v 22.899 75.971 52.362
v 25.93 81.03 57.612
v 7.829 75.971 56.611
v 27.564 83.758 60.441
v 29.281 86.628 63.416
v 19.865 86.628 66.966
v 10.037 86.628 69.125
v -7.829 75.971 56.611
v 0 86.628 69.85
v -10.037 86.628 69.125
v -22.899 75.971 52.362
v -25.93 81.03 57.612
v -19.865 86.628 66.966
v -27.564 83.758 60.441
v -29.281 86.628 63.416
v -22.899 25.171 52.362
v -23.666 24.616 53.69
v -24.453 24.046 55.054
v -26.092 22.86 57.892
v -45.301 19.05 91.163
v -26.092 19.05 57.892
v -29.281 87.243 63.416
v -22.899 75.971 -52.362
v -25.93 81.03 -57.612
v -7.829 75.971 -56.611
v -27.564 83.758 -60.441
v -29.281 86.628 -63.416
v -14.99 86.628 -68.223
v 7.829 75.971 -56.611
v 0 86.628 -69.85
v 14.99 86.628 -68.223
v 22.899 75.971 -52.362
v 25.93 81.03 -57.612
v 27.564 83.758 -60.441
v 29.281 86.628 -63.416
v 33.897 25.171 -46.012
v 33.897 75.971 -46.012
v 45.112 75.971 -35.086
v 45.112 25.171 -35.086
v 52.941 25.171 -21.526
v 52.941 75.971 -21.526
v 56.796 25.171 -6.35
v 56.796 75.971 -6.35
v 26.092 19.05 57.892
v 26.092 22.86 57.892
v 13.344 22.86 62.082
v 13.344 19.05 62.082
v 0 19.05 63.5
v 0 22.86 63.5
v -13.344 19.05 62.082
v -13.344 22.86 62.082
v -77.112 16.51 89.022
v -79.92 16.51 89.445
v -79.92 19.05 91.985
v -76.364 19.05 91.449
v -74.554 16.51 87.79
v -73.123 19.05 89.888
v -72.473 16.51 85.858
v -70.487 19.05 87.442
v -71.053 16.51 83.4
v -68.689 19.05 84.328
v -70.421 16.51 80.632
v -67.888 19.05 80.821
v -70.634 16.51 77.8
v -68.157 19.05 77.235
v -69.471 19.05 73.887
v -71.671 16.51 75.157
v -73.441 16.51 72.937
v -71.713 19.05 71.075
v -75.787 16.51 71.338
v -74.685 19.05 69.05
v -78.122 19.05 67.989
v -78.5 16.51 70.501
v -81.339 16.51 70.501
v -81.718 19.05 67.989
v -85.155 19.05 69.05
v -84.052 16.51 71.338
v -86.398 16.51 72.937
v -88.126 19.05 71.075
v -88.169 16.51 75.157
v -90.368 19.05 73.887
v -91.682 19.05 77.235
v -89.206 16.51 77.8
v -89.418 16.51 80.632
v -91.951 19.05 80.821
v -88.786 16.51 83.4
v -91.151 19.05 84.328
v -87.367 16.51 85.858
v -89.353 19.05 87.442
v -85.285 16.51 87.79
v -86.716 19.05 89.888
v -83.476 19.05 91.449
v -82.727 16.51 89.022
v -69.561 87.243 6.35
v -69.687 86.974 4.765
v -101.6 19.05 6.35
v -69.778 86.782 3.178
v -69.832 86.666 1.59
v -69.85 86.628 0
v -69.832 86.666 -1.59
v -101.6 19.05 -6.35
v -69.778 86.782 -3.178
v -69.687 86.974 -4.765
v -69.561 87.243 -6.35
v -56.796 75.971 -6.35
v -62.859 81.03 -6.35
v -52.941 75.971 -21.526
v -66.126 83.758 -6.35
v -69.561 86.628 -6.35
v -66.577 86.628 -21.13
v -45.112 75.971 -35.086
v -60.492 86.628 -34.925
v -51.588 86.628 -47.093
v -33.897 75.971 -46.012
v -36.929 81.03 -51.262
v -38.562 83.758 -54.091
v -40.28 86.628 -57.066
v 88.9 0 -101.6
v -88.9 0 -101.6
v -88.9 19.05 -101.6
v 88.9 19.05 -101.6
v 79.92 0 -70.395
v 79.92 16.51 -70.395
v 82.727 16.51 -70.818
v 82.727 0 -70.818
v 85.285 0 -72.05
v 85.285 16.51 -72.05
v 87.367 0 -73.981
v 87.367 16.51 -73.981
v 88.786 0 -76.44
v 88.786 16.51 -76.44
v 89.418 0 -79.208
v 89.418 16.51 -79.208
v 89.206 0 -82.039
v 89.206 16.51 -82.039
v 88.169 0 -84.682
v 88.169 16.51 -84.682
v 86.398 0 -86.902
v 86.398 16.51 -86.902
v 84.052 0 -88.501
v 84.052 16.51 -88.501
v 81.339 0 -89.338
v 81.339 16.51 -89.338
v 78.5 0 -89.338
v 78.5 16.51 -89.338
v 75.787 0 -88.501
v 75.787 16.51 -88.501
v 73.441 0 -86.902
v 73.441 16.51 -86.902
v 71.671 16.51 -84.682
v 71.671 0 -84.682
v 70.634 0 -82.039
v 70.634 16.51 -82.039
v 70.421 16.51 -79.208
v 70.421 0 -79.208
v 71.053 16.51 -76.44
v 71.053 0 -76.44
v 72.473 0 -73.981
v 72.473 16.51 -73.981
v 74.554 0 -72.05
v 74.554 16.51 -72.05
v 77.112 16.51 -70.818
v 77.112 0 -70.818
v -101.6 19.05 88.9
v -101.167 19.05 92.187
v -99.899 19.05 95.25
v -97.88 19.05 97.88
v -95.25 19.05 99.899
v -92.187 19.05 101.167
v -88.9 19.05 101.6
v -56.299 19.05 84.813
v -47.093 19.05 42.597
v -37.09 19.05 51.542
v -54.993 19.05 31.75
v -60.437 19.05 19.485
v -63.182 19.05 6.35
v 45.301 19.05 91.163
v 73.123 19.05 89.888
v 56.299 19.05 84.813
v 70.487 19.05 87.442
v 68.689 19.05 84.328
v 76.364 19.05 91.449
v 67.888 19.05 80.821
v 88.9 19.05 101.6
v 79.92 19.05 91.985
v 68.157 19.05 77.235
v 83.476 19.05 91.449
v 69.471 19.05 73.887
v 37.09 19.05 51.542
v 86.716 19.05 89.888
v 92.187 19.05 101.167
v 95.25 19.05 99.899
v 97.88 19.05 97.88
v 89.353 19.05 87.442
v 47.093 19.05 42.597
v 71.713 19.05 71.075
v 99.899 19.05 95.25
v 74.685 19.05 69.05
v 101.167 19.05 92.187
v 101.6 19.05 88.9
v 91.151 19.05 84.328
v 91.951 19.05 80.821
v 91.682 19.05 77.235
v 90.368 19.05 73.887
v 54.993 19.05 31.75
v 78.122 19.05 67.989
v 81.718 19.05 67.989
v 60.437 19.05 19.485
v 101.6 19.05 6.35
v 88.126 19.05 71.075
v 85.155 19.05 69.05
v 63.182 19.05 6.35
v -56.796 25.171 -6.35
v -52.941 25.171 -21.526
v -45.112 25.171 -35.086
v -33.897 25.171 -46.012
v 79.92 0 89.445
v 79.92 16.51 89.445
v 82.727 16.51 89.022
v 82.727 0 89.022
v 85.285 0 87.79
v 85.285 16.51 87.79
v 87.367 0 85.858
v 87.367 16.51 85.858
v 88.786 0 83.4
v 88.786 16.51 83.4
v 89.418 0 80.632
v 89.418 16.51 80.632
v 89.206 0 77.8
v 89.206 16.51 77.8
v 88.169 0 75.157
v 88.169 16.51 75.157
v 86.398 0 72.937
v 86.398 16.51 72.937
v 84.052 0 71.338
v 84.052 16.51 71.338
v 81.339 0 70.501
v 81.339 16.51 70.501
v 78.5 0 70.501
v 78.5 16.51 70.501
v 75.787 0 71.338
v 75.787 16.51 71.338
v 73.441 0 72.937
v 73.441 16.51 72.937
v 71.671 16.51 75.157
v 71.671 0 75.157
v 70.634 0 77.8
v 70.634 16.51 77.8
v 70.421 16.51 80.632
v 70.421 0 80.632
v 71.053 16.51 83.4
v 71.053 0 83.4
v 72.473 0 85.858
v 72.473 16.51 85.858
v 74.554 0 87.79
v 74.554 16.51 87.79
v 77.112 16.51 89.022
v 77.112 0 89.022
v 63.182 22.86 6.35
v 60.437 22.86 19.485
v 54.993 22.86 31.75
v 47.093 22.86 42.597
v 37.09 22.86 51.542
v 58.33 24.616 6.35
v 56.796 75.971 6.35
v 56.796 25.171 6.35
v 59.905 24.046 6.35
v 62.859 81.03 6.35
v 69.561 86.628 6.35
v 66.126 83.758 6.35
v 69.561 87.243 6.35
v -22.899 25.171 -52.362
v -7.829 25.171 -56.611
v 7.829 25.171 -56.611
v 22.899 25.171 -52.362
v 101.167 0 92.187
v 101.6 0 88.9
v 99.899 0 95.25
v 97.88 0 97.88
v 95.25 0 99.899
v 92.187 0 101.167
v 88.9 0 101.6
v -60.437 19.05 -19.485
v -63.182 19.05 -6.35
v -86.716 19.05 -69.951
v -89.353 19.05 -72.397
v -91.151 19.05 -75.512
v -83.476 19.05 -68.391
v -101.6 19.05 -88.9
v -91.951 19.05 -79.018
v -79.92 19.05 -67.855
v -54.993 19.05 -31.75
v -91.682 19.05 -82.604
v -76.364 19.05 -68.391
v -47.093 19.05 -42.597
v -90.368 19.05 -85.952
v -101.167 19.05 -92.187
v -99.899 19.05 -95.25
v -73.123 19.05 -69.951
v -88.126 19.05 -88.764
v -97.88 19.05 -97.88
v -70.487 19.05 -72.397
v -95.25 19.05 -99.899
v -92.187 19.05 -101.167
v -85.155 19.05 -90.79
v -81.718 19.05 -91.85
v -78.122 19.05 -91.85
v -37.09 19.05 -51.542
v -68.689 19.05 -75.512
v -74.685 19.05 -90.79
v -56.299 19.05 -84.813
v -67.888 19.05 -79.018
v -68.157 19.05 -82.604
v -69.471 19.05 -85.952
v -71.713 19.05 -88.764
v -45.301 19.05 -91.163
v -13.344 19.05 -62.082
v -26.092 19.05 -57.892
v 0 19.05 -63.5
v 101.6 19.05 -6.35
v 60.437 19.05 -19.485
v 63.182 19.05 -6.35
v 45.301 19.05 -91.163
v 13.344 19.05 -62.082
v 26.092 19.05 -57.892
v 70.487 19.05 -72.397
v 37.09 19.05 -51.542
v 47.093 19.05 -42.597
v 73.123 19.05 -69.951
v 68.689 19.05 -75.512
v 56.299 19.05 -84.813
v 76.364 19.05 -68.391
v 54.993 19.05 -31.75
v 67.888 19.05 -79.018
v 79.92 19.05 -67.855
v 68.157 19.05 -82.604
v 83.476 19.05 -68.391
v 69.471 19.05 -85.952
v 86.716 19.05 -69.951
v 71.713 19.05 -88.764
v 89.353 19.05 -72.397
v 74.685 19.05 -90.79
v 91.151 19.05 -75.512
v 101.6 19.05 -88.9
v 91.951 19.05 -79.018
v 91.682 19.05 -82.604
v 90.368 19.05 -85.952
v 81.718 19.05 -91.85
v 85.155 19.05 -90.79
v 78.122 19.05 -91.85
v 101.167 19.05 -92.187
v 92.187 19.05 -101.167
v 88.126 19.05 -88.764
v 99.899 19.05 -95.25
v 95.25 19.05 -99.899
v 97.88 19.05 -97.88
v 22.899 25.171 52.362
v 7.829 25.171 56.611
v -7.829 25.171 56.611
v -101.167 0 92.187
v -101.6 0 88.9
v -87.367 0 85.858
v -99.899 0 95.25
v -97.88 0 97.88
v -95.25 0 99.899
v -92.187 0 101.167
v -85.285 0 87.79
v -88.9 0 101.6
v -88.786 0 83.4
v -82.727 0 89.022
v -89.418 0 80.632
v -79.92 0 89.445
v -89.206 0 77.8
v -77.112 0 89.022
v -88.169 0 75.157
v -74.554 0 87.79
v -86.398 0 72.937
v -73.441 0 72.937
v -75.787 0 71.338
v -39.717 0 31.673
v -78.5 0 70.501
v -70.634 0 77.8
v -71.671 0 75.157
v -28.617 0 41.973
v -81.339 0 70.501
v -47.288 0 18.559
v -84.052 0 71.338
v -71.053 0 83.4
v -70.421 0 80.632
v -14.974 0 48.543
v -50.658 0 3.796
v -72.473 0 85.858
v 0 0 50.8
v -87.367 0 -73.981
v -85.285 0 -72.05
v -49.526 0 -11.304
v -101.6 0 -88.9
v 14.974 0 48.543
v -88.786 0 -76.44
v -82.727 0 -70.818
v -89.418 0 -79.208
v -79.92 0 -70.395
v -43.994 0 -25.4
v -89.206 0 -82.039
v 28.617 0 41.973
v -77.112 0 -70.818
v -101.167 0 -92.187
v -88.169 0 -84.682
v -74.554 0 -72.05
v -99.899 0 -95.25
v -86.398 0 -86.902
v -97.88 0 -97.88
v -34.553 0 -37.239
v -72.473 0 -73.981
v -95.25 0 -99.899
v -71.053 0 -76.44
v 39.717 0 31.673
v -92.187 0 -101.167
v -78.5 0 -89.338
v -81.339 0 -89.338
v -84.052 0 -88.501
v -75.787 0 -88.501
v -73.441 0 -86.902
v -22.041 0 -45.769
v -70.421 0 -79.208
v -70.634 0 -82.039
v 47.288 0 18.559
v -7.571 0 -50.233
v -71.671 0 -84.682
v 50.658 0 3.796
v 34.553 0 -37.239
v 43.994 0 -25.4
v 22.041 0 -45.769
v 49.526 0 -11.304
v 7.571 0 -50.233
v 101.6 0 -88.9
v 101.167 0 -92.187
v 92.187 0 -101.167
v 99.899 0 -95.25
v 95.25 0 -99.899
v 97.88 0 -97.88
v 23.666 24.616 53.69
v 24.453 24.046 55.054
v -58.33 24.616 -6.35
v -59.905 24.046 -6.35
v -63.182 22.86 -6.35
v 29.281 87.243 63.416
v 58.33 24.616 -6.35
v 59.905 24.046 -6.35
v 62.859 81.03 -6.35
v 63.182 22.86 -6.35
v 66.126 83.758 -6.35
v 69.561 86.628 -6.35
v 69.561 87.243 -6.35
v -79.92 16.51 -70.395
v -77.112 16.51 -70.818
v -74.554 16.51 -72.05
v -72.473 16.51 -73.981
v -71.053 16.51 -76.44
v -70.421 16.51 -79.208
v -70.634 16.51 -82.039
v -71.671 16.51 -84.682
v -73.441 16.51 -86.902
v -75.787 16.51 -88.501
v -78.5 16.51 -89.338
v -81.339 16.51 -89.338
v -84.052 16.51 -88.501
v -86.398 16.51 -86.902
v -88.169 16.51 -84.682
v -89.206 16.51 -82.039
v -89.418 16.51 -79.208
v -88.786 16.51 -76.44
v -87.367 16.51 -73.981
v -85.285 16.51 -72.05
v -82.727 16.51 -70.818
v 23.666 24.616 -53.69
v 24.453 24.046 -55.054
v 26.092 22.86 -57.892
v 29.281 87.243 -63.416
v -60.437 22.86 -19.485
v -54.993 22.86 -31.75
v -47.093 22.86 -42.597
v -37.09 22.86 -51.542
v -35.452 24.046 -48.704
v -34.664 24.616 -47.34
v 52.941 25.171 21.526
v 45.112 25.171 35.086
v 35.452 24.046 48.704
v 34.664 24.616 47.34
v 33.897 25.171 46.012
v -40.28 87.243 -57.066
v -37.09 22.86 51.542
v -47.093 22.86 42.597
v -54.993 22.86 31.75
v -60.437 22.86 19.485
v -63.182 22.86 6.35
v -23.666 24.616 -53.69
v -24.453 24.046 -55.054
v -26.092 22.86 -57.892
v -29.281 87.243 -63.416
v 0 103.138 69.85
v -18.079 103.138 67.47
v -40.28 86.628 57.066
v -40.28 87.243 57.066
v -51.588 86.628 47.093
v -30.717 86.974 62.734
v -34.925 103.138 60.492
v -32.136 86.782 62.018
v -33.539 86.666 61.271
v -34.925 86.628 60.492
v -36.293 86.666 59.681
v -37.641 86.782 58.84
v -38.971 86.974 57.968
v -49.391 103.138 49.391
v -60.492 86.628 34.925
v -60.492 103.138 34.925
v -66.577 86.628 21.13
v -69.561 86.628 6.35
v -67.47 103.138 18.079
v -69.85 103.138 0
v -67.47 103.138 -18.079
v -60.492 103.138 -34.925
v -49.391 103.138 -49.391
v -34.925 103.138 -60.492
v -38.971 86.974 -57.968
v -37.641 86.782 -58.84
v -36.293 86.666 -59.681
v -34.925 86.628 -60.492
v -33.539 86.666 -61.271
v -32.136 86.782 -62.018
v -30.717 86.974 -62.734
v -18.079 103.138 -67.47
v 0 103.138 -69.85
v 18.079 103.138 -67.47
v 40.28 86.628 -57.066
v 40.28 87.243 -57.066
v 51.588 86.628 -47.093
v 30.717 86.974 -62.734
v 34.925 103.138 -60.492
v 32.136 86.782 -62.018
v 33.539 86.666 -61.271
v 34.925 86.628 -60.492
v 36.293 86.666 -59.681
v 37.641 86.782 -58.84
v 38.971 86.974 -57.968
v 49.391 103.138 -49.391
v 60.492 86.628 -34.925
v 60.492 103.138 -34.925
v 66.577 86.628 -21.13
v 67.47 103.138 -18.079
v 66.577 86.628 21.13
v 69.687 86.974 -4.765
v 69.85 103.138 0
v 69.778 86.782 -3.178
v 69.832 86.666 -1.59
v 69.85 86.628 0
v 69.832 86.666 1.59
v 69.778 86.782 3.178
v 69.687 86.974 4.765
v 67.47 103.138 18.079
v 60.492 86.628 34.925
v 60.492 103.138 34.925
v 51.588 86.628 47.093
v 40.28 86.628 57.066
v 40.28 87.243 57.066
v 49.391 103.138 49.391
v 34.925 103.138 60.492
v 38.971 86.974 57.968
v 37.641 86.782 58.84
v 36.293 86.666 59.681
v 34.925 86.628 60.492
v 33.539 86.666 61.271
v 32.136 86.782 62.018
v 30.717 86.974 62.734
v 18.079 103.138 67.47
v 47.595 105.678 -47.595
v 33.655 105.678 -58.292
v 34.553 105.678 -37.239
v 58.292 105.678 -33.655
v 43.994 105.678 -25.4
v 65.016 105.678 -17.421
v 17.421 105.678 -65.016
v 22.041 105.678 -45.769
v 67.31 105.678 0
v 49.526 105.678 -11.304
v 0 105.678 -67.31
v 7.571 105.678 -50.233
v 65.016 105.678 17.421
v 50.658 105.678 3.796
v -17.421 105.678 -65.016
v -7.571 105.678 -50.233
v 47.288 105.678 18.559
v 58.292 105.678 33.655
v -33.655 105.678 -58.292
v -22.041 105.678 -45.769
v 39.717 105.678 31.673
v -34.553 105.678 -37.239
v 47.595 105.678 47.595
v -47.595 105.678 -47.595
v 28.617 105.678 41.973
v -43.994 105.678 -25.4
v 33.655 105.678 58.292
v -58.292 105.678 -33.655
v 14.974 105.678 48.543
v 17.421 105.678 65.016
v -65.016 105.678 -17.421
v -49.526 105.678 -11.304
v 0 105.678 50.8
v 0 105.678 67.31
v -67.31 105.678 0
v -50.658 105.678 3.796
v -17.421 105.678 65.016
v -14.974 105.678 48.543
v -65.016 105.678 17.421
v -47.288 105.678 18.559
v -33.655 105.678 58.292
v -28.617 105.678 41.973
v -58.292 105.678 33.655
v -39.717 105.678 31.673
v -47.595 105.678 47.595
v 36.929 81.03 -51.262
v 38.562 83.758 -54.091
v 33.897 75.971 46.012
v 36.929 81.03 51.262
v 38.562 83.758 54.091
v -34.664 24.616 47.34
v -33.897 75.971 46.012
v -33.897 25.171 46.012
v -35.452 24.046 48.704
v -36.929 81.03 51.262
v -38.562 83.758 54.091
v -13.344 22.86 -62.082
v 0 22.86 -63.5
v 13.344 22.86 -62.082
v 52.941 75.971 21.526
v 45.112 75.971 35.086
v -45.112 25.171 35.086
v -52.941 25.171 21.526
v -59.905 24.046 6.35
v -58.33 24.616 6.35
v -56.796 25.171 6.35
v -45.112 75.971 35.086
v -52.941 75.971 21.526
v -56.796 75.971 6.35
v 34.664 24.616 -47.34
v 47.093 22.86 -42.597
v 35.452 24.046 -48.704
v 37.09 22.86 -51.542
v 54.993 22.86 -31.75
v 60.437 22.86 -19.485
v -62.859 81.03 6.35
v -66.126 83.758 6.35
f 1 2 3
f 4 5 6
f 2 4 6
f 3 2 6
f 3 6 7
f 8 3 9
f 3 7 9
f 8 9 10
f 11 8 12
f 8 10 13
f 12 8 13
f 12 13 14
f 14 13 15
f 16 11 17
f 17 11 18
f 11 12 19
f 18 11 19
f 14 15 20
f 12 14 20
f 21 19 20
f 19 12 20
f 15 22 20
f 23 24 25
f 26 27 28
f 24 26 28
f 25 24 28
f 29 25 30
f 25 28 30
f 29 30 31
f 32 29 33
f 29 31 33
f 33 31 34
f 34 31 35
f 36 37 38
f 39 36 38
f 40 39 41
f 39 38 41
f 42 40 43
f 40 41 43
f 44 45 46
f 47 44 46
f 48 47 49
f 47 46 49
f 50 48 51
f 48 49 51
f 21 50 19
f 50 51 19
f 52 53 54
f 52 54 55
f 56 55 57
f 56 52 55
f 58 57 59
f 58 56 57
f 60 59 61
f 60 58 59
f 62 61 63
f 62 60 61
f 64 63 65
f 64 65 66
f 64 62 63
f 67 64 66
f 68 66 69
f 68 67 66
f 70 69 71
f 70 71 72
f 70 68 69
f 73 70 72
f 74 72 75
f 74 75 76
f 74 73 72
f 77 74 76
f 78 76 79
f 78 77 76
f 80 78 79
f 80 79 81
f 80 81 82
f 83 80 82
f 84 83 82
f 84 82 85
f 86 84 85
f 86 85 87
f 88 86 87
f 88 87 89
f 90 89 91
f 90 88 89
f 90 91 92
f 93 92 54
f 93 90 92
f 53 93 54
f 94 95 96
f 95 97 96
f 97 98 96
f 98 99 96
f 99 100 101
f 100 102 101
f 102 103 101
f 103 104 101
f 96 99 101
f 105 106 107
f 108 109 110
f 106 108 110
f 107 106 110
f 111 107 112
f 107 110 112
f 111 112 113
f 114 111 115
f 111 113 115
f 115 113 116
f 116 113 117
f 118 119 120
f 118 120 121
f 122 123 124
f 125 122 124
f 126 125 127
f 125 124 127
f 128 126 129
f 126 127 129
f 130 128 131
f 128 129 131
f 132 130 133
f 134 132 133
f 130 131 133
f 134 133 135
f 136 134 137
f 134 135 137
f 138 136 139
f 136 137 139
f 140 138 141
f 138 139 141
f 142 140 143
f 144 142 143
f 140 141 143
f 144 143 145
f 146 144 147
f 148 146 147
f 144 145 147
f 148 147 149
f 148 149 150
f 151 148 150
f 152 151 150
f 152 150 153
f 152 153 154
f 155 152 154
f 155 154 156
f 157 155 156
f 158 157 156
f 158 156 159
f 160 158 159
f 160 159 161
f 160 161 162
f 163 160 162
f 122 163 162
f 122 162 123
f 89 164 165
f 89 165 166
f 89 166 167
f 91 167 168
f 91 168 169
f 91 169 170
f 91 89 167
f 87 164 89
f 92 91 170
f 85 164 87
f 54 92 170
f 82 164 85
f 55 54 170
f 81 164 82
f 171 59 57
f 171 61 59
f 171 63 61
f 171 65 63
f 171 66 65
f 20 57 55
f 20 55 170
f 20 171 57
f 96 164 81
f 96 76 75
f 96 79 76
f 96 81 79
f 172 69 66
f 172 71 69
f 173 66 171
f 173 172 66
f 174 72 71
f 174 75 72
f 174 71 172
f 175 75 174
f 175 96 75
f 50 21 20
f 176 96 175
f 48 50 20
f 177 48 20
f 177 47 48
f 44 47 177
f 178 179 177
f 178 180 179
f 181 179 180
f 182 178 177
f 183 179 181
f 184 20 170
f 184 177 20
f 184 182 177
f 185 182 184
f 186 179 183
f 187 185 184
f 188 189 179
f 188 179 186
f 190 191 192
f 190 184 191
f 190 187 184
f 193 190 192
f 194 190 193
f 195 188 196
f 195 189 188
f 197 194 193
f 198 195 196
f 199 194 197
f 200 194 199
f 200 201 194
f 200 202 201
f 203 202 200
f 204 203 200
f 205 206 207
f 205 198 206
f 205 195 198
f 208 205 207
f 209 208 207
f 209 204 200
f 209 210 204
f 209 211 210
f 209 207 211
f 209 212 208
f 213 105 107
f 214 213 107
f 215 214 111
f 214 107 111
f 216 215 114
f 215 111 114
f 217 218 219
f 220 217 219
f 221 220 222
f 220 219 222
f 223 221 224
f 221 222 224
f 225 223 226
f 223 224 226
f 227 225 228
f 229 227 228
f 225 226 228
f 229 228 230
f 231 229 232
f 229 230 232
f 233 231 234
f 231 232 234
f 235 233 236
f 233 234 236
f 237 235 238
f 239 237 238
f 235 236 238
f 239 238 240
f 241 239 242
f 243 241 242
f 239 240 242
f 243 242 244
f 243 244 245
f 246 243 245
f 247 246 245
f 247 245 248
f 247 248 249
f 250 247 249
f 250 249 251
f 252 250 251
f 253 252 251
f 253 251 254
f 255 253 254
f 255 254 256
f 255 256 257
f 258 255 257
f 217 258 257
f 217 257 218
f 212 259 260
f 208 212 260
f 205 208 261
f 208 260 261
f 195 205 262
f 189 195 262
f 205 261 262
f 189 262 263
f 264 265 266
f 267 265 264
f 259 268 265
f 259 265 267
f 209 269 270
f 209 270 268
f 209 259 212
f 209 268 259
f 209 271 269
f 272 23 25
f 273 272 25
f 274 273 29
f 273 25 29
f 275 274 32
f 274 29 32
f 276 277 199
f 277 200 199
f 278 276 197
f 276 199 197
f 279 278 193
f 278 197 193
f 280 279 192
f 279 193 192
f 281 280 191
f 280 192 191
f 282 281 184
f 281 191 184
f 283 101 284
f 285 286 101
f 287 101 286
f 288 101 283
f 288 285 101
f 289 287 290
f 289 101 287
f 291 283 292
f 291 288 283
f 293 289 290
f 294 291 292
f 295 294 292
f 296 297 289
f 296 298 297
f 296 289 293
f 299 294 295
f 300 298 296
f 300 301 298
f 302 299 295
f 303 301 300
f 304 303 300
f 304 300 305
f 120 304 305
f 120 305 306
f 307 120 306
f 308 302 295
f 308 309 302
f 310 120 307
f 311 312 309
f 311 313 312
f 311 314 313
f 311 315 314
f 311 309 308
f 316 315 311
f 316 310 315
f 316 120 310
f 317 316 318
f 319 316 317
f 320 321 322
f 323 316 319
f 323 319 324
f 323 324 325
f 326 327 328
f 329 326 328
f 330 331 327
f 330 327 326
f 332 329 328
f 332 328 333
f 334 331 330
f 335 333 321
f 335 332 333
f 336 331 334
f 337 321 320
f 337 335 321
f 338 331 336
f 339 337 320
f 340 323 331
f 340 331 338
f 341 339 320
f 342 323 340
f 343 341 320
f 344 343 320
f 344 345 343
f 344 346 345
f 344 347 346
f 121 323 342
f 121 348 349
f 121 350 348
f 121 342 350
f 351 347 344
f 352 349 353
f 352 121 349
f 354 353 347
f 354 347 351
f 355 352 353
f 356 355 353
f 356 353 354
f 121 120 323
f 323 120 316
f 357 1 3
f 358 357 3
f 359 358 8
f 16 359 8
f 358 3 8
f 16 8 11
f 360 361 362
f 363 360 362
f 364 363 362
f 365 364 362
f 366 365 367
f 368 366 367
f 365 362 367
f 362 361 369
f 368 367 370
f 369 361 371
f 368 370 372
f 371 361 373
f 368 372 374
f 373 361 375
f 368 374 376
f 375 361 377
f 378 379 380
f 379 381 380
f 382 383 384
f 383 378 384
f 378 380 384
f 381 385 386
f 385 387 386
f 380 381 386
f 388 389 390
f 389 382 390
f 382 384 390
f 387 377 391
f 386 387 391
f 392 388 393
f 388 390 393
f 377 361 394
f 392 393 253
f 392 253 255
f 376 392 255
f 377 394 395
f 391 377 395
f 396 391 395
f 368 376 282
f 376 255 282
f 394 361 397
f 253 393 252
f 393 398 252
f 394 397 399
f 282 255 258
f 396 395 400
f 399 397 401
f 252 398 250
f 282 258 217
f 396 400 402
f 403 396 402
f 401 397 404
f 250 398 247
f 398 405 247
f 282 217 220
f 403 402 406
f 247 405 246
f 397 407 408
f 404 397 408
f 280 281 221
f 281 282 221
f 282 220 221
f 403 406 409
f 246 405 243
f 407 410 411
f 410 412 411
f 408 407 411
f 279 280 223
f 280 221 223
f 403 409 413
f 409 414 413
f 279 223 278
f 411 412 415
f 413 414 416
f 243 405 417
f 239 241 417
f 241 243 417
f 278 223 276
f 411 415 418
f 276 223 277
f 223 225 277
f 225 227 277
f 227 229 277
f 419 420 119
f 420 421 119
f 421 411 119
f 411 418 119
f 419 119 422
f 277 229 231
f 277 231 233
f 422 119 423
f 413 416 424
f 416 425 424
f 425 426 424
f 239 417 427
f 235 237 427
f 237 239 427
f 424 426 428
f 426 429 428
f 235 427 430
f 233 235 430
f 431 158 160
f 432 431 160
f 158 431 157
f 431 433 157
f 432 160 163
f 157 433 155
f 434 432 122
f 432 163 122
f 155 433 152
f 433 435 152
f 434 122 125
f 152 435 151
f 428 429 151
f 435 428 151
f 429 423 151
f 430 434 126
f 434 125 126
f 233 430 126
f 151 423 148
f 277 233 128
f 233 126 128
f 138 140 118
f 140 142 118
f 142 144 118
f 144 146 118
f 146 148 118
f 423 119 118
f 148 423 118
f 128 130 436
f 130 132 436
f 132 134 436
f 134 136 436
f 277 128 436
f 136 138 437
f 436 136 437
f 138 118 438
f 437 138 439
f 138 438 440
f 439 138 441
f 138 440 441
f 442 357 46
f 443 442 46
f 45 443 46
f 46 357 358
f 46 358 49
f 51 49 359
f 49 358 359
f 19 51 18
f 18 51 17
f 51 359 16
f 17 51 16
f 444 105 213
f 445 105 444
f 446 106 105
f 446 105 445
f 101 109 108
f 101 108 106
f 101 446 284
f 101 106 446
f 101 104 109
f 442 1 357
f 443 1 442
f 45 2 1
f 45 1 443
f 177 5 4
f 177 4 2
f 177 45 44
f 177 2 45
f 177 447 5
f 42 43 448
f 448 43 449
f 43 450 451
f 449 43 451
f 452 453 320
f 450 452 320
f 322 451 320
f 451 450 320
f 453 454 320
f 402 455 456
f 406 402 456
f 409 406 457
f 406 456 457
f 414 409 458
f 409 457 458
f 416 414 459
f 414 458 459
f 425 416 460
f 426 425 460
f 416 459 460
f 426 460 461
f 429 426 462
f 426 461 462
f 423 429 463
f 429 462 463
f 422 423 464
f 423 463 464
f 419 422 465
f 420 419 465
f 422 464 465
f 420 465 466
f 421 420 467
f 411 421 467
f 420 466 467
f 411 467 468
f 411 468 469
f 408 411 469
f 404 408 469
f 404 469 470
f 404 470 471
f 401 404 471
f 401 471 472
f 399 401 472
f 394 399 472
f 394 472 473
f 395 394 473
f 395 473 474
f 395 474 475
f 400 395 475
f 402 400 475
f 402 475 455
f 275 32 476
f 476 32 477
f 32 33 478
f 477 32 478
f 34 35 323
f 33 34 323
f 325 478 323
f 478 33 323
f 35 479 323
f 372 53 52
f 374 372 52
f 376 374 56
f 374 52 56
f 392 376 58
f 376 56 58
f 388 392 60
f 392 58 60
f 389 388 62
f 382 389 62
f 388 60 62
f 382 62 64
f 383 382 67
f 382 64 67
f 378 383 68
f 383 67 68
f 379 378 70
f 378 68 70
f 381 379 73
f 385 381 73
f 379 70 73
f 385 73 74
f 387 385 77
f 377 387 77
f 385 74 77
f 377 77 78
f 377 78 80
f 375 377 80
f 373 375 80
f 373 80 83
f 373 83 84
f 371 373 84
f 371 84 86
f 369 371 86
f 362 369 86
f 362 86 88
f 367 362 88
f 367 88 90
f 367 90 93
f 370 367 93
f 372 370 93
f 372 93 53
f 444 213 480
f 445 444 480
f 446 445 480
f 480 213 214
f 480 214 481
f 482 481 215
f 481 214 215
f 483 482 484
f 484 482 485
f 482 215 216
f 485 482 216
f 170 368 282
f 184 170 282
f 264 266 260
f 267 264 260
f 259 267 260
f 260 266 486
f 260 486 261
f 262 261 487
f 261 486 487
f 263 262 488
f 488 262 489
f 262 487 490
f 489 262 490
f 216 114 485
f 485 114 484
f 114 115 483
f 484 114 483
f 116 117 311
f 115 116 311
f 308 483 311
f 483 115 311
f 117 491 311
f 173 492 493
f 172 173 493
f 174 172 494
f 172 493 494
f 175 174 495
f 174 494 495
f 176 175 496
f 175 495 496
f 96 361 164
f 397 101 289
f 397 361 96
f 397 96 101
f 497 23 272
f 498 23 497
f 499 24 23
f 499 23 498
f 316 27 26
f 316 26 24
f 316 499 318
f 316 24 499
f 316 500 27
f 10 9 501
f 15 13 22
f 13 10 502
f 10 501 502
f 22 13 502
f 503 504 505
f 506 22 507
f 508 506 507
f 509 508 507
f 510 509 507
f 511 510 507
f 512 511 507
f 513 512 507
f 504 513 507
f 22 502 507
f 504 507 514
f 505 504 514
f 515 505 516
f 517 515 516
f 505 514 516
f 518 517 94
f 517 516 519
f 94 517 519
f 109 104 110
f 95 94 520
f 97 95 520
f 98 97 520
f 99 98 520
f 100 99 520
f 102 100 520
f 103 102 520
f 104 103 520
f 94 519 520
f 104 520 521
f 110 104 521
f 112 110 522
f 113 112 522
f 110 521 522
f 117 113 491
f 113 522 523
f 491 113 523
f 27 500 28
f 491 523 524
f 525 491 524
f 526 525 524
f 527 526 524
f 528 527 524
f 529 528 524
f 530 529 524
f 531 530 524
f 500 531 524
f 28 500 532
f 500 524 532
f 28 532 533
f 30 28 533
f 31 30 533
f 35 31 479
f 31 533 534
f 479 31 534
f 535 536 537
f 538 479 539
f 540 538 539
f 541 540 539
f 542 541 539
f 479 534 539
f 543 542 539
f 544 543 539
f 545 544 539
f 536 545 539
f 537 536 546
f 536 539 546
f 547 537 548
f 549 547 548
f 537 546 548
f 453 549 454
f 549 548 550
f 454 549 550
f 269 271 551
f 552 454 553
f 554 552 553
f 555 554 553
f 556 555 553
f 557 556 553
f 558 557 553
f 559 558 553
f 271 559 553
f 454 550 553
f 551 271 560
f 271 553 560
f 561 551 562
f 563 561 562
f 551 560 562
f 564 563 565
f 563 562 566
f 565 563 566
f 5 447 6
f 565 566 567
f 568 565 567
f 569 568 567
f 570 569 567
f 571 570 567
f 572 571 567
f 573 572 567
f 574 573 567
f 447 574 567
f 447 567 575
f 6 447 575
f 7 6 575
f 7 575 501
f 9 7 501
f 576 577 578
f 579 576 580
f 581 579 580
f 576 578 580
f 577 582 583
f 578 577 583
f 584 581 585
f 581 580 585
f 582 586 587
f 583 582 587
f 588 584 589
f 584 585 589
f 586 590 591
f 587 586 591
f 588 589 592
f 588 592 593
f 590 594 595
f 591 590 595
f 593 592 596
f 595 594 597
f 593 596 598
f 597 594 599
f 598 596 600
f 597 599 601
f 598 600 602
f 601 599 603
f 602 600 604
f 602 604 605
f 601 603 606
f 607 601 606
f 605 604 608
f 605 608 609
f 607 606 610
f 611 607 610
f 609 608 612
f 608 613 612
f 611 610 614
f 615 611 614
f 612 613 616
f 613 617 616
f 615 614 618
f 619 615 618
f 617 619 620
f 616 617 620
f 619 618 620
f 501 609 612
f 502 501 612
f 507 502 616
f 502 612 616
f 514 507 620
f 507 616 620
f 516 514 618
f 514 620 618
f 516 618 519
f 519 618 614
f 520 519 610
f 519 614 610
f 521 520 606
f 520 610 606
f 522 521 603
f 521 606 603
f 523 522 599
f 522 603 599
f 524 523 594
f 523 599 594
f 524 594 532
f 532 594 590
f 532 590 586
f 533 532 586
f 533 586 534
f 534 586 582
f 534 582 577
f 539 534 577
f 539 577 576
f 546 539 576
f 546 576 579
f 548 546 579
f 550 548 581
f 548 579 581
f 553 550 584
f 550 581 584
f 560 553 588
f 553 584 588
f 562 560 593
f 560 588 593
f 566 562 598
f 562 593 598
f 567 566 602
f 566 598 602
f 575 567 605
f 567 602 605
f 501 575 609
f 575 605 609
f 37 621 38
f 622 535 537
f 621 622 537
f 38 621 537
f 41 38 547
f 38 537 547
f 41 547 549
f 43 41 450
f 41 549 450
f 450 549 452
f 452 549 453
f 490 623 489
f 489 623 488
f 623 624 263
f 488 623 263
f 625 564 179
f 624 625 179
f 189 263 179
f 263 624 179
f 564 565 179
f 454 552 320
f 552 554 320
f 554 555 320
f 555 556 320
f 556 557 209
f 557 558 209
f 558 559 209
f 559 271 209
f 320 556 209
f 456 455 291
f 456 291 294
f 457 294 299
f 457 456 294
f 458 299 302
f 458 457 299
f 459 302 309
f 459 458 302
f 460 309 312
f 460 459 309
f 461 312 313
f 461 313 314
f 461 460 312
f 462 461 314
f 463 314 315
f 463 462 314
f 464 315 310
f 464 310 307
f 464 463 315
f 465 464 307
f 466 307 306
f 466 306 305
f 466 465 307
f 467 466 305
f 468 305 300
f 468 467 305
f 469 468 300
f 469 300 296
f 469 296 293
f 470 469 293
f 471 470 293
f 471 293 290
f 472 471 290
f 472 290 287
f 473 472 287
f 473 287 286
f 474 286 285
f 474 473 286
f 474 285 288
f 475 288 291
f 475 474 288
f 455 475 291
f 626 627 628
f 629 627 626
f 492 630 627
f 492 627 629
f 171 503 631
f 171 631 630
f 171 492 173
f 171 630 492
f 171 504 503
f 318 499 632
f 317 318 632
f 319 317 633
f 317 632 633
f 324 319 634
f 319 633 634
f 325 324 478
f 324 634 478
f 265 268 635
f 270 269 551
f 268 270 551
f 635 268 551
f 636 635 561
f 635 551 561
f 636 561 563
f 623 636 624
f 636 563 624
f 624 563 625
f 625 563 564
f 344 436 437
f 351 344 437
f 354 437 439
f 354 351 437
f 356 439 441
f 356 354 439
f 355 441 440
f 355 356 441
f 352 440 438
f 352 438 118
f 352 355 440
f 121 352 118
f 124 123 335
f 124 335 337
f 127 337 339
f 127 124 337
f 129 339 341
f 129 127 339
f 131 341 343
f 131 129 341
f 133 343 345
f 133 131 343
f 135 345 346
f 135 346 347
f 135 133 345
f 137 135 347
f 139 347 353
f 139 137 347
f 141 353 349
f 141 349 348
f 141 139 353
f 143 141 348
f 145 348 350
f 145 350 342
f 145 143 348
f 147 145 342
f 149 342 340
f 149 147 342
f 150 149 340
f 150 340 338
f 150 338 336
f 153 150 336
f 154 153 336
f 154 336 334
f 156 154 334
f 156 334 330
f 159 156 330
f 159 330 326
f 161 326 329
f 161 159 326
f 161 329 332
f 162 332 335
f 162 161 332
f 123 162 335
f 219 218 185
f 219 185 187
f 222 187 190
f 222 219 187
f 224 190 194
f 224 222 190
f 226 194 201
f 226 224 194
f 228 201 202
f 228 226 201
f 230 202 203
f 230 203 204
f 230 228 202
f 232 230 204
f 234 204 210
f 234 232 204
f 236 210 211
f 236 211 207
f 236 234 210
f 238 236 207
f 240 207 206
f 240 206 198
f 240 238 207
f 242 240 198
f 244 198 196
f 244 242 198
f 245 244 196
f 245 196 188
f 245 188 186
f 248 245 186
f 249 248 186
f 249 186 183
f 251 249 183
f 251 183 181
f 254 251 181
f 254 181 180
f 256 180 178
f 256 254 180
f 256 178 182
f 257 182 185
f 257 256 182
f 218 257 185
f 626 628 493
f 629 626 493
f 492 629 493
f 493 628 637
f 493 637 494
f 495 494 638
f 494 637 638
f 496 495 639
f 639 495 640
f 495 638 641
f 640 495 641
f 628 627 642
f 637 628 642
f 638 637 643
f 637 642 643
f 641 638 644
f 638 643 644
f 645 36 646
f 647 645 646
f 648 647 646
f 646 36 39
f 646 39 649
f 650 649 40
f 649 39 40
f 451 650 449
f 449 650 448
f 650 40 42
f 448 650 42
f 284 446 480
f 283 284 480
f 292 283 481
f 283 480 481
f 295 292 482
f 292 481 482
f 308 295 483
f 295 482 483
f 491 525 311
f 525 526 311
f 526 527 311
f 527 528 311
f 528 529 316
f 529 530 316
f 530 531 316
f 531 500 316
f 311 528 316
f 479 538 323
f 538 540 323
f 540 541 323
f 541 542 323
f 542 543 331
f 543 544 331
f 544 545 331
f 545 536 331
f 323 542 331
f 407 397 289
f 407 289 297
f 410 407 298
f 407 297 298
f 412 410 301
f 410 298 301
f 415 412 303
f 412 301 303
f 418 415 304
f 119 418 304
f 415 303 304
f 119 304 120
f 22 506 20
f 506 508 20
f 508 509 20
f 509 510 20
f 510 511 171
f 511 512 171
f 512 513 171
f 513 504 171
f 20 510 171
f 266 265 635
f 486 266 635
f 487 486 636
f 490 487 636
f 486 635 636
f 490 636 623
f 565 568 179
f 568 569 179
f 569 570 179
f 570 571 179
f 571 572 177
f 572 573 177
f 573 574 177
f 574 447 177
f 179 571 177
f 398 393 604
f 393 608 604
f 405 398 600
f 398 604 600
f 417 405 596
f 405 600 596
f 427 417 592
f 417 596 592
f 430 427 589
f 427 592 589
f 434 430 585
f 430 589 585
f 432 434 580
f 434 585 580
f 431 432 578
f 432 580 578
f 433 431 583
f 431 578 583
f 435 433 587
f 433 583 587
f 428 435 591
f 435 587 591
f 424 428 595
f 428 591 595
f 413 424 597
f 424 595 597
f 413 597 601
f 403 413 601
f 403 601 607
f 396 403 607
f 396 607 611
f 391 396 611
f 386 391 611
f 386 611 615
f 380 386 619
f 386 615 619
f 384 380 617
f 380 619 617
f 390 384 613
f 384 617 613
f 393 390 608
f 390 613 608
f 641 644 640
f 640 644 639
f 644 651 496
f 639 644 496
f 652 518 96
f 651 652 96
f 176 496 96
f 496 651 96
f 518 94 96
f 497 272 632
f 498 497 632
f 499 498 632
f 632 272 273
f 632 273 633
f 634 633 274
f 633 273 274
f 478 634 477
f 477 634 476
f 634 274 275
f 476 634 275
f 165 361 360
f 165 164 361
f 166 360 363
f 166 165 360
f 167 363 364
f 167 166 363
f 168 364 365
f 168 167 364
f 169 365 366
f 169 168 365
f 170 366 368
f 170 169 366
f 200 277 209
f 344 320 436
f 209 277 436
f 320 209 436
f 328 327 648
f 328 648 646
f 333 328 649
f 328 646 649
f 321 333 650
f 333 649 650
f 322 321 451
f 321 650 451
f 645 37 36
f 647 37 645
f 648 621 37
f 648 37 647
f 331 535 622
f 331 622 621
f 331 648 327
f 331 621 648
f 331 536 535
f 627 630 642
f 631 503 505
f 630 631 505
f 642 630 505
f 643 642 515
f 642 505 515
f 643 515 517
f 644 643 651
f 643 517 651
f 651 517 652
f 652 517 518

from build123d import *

# Parameters (mm, degrees)
BASE_SKETCH_W               = 203.2
BASE_SKETCH_H               = 203.2
BASE_FEATURE_DEPTH          = 19.05
SHAFT_HOLE_SKETCH_R         = 50.8
SHAFT_HOLE_FEATURE_DEPTH    = 179.361745911
BASE_FILLET_R               = 12.7
BOLTING_HOLES_SKETCH_R      = 9.525
BOLTING_HOLES_FEATURE_DEPTH = 168.778102347
RIB_SUPPORT_FEATURE_REACH   = 180.362
RIB_SUPPORT_SKETCH_WALL_W   = 433.38819801
RIB_SUPPORT_SKETCH_WALL_H   = 12.7
RIB_SUPPORT_PATTERN_COUNT   = 6
CHAMFER1_SIZE               = 2.54


with BuildPart() as part:
    # Base Sketch → Base Feature (new body)
    with BuildSketch(Plane(origin=(0, 0, 0), x_dir=(1, 0, 0), z_dir=(0, 1, 0))):
        Rectangle(BASE_SKETCH_W, BASE_SKETCH_H)
    extrude(amount=BASE_FEATURE_DEPTH)

    # Shaft Housing Sketch → Shaft Housing Feature (revolve)
    with BuildSketch(Plane.XY, mode=Mode.PRIVATE) as shaft_housing_feature_sk:
        Polygon((63.5, 19.05), (63.5, 22.86), (57.15, 25.171210988), (57.15, 75.971210988), (69.85, 86.627776304), (69.85, 105.677776304), (50.8, 105.677776304), (50.8, 19.05), align=None)
    revolve(shaft_housing_feature_sk.sketch.rotate(Axis((0, 0, 0), (0, -1, 0)), 90), axis=Axis((0, 0, 0), (0, -1, 0)))

    # Shaft Hole Sketch → Shaft Hole Feature (cut, through all)
    with BuildSketch(Plane(origin=(0, 105.677776304, 0), x_dir=(1, 0, 0), z_dir=(0, 1, 0))):
        with Locations(Location((0, 0, 0), (0, 0, 270))):
            Circle(SHAFT_HOLE_SKETCH_R)
    extrude(amount=-SHAFT_HOLE_FEATURE_DEPTH, mode=Mode.SUBTRACT)

    # Base Fillet
    base_fillet_edges = [part.edges().sort_by_distance(p)[0] for p in [
        (-101.6, 9.525, -101.6),
        (101.6, 9.525, -101.6),
        (101.6, 9.525, 101.6),
        (-101.6, 9.525, 101.6),
    ]]
    fillet(base_fillet_edges, radius=BASE_FILLET_R)

    # Bolting Holes Sketch → Bolting Holes Feature (cut, through all)
    with BuildSketch(Plane(origin=(0, 19.05, 0), x_dir=(1, 0, 0), z_dir=(0, 1, 0))):
        with Locations(Location((-79.919743879, 79.919743879, 0), (0, 0, 270))):
            Circle(BOLTING_HOLES_SKETCH_R)
        with Locations(Location((79.919743879, 79.919743879, 0), (0, 0, 270))):
            Circle(BOLTING_HOLES_SKETCH_R)
        with Locations(Location((79.919743879, -79.919743879, 0), (0, 0, 270))):
            Circle(BOLTING_HOLES_SKETCH_R)
        with Locations(Location((-79.919743879, -79.919743879, 0), (0, 0, 270))):
            Circle(BOLTING_HOLES_SKETCH_R)
    extrude(amount=-BOLTING_HOLES_FEATURE_DEPTH, mode=Mode.SUBTRACT)

    # Rib Support Sketch wall → Rib Support Feature (add, up to next)
    with BuildSketch(Plane(origin=(-85.725, 52.838888152, 0), x_dir=(-0.425234379412, -0.905083268305, 0), z_dir=(0.905083268305, -0.425234379412, 0)), mode=Mode.PRIVATE) as rib_support_feature_sk1:
        Rectangle(RIB_SUPPORT_SKETCH_WALL_W, RIB_SUPPORT_SKETCH_WALL_H)
    rib_support_feature_tool1 = extrude(rib_support_feature_sk1.sketch, amount=RIB_SUPPORT_FEATURE_REACH, mode=Mode.PRIVATE) - part.part
    rib_support_feature = rib_support_feature_tool1.solids().sort_by_distance((-85.725, 52.838888152, 0))[0]
    add(rib_support_feature)

    # Rib Support Pattern: Rib Support Feature ×6 about axis
    rib_support_pattern_axis = Axis((0, 0, 0), (0, 1, 0))
    for i in range(1, RIB_SUPPORT_PATTERN_COUNT):
        add(rib_support_feature.rotate(rib_support_pattern_axis, i * 360 / RIB_SUPPORT_PATTERN_COUNT))

    # Chamfer1
    chamfer1_edges = [part.edges().sort_by_distance(p)[0] for p in [
        (0, 105.677776304, -69.85),
        (-79.919743879, 19.05, -89.444743879),
        (79.919743879, 19.05, -89.444743879),
        (79.919743879, 19.05, 70.394743879),
        (-79.919743879, 19.05, 70.394743879),
    ]]
    chamfer(chamfer1_edges, length=CHAMFER1_SIZE)


solid = part.part
